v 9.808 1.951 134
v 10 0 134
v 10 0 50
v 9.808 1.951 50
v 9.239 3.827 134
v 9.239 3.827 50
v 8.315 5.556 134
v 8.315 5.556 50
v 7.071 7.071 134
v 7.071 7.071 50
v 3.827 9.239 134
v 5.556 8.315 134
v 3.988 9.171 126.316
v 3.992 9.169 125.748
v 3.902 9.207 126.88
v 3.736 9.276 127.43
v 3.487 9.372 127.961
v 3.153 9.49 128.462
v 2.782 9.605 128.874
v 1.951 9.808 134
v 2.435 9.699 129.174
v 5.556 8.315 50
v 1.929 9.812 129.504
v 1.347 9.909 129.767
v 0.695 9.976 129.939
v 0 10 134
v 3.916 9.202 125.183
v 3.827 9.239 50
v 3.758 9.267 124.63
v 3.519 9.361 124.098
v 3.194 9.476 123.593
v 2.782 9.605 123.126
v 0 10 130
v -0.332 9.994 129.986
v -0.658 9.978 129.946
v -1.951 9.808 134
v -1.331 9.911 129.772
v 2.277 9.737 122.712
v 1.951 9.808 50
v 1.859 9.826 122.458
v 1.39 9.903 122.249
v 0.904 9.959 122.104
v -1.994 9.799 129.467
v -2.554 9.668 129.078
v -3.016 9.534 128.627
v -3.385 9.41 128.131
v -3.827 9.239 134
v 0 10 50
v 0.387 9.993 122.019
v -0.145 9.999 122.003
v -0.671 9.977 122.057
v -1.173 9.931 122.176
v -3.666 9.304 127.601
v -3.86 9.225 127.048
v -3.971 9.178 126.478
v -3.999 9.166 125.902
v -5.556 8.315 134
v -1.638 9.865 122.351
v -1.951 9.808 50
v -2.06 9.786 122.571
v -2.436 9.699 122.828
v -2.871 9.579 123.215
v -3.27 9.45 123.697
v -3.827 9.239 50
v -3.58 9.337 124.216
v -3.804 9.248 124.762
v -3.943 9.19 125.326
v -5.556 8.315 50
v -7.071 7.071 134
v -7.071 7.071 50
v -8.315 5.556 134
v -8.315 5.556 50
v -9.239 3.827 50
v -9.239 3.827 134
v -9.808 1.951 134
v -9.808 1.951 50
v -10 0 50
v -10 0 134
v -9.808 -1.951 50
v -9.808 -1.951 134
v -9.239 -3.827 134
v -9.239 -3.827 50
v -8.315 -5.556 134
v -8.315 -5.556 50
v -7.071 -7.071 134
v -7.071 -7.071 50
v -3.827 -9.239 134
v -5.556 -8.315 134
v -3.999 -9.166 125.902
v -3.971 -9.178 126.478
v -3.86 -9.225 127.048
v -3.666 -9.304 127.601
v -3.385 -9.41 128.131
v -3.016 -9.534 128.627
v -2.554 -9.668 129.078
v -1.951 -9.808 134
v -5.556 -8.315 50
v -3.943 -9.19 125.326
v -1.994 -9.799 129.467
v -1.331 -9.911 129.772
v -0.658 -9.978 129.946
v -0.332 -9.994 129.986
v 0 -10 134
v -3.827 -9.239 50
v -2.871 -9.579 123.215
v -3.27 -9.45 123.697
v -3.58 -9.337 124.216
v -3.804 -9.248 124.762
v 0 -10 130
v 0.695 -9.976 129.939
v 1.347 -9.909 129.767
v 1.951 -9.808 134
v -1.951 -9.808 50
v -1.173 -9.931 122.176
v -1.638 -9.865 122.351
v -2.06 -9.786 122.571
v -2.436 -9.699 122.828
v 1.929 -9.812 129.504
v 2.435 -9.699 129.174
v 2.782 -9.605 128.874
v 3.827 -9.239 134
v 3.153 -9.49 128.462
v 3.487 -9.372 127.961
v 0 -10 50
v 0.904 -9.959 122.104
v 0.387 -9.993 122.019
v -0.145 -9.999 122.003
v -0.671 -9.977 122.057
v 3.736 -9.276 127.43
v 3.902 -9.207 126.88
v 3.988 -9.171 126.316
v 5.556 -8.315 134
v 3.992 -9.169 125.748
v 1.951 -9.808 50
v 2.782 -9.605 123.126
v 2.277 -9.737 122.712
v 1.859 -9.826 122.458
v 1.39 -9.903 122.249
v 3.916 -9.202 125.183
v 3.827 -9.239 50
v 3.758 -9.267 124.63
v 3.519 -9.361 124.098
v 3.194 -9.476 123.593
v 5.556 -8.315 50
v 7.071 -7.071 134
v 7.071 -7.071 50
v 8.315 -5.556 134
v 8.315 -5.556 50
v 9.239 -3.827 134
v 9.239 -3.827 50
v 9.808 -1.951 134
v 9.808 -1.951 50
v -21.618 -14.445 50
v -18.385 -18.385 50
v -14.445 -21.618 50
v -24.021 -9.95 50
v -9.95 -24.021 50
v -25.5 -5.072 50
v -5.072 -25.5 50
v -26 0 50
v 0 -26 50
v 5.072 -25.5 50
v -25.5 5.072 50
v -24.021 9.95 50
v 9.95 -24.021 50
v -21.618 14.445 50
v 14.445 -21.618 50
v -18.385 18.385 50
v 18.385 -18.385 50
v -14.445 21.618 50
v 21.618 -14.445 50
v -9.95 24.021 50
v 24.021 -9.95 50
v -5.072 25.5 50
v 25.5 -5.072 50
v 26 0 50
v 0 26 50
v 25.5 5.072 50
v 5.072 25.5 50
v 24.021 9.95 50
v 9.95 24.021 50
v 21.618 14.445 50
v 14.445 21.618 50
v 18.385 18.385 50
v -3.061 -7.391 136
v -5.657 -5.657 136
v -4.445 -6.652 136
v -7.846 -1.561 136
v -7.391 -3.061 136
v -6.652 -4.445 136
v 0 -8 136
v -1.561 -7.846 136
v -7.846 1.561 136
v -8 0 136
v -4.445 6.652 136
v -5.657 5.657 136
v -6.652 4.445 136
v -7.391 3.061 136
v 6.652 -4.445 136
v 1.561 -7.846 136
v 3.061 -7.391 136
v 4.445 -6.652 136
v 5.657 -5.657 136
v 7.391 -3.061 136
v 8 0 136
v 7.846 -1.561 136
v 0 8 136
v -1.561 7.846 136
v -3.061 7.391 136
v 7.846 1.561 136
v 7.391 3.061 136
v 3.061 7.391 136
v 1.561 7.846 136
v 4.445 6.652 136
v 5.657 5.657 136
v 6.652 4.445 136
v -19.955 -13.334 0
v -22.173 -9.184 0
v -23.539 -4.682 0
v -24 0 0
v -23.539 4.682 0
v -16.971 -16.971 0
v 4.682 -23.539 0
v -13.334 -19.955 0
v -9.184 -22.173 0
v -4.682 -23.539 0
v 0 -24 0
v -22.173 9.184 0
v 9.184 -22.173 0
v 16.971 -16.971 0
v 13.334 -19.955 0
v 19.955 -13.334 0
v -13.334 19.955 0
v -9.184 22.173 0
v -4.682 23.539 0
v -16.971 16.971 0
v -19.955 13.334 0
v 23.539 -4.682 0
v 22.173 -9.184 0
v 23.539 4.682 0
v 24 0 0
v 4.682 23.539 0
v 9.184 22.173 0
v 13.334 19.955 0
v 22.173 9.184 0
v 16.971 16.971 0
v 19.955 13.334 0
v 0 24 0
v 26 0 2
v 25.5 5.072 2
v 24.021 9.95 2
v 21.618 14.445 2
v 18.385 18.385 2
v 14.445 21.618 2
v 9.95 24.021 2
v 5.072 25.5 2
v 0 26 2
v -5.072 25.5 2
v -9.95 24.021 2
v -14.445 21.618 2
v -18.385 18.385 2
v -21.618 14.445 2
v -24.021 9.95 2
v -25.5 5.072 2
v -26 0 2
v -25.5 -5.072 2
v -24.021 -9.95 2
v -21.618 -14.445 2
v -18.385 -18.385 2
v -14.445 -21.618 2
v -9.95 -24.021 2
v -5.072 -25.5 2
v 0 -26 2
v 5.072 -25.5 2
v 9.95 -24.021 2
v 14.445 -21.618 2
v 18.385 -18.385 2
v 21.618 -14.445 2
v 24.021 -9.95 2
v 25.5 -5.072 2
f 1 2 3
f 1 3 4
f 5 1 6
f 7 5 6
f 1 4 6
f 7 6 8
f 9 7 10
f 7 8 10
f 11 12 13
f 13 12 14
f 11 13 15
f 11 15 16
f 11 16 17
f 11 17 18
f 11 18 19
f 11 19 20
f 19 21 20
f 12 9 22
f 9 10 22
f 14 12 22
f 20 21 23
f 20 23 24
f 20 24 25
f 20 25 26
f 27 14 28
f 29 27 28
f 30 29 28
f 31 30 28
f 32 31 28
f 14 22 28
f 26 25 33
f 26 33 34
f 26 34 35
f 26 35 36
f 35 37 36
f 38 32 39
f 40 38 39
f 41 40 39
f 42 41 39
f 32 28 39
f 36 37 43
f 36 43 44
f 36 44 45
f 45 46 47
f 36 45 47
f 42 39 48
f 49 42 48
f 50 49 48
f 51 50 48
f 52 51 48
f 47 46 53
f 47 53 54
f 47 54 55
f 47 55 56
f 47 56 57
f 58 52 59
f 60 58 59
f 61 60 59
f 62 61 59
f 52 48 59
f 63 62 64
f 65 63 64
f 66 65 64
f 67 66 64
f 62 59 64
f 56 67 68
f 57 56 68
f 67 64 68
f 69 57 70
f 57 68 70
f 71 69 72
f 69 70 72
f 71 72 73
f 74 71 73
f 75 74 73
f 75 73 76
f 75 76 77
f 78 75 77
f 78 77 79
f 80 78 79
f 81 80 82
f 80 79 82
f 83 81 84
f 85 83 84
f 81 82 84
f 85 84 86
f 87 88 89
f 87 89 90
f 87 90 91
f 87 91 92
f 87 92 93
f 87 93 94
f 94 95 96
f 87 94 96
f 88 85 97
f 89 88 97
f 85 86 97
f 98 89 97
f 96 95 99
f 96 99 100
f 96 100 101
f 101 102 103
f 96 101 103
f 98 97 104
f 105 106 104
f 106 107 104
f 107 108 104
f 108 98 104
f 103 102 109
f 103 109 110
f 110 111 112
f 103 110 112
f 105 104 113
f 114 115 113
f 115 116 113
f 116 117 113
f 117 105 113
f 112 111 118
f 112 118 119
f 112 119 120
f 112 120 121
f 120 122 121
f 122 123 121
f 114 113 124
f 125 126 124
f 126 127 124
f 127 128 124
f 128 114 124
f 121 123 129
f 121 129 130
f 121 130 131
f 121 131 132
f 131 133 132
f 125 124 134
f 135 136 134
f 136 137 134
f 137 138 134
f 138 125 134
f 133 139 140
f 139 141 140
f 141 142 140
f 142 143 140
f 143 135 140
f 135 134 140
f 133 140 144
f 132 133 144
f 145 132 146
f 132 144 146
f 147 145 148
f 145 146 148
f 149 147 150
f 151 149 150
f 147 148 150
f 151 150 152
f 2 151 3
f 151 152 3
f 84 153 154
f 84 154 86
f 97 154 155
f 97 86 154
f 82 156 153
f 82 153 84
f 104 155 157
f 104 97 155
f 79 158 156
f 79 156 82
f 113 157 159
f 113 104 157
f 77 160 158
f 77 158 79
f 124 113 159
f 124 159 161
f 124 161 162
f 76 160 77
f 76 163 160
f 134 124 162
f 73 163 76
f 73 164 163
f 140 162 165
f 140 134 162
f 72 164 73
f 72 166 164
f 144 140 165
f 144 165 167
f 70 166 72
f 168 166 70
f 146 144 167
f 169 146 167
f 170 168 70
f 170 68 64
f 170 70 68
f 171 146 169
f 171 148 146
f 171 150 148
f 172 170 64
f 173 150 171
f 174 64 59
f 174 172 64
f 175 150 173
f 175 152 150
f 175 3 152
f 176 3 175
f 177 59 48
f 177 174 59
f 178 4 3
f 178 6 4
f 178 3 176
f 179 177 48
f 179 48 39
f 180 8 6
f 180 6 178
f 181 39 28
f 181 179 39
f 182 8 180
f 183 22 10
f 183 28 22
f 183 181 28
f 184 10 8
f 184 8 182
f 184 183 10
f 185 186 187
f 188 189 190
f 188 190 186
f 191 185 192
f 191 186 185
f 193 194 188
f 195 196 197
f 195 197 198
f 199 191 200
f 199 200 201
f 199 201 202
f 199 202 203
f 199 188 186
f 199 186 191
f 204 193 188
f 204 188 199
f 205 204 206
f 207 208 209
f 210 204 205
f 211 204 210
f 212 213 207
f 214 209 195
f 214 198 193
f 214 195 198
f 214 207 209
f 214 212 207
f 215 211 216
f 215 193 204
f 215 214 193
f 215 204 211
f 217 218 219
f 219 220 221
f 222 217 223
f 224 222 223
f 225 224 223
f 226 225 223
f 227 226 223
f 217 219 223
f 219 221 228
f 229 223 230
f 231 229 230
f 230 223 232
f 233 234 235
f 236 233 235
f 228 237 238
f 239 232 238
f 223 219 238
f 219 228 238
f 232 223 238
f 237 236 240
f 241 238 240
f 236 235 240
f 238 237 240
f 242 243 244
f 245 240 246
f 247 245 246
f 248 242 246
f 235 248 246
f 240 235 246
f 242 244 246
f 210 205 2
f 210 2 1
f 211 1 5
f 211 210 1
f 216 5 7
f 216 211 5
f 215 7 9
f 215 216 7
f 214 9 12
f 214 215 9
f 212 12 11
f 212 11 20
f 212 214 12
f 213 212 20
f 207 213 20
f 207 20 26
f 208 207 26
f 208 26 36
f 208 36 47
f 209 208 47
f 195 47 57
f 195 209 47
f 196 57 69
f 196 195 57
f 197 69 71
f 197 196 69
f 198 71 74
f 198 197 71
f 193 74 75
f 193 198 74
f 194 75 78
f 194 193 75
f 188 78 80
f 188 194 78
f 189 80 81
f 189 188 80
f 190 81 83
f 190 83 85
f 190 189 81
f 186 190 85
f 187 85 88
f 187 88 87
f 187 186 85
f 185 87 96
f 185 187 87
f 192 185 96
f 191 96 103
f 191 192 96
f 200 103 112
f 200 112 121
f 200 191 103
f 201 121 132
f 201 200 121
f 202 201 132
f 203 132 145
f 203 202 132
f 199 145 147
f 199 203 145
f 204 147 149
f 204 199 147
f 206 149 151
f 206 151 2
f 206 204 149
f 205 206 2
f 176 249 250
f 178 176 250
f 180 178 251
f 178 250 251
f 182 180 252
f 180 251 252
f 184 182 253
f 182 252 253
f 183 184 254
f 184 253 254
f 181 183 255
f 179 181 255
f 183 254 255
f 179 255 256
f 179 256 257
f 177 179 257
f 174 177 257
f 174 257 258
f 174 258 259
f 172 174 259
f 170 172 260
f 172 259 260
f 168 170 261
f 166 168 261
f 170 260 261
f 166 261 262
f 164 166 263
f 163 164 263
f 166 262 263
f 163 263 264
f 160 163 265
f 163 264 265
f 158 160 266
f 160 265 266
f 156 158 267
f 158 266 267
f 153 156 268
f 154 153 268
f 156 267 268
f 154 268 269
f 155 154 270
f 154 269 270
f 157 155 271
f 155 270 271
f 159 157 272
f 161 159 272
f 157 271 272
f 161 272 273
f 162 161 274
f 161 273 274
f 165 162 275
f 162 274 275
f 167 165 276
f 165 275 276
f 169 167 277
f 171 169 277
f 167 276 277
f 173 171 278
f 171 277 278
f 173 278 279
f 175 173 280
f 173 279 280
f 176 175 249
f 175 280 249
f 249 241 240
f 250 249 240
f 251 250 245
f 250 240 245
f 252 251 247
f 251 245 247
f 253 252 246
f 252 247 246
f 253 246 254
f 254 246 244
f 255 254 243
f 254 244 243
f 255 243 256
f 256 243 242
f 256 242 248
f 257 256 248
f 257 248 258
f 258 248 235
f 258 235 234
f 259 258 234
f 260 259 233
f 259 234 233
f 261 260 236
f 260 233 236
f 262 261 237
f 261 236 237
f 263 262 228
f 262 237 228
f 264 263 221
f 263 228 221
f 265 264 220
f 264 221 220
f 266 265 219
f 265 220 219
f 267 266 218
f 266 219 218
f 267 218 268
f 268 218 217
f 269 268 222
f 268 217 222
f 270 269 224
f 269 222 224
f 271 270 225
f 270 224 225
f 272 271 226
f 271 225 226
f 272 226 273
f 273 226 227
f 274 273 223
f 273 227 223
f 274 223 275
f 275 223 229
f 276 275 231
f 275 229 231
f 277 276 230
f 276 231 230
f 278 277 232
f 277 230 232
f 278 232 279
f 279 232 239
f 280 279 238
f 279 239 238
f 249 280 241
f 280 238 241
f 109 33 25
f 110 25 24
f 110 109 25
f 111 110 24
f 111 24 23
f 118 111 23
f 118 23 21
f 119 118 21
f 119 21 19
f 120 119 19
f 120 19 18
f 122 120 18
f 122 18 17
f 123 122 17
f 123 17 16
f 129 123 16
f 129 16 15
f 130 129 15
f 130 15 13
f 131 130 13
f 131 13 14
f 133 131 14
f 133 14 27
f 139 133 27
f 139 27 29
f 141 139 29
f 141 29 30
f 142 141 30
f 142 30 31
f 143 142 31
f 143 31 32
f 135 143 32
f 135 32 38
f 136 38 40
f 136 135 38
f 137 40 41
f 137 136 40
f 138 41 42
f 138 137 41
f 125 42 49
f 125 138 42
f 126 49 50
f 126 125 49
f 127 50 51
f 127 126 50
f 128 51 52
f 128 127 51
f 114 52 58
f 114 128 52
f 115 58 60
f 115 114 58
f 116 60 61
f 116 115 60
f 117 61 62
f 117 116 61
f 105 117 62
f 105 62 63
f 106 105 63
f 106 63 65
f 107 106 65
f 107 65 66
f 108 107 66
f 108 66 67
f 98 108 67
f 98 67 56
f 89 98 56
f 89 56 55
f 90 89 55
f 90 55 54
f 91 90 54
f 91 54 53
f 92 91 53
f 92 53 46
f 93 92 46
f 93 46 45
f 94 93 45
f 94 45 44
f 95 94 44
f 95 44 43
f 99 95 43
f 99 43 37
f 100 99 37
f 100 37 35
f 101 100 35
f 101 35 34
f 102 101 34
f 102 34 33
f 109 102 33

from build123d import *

# Parameters (mm, degrees)
SCHIZZO1_R             = 26
ESTRUSIONE1_DEPTH      = 50
SCHIZZO2_R             = 10
ESTRUSIONE2_DEPTH      = 86
SMUSSO1_SIZE           = 2
ESTRUSIONE3_DEPTH      = 141.882930123
ESTRUSIONE3_DEPTH_BACK = 141.882930123
SCHIZZO3_R             = 4
SMUSSO2_SIZE           = 2


with BuildPart() as part:
    # Schizzo1 → Estrusione1 (new body)
    with BuildSketch(Plane.XY):
        Circle(SCHIZZO1_R)
    extrude(amount=ESTRUSIONE1_DEPTH)

    # Schizzo2 → Estrusione2 (add)
    with BuildSketch(Plane.XY.offset(50)):
        Circle(SCHIZZO2_R)
    extrude(amount=ESTRUSIONE2_DEPTH)

    # Smusso1
    smusso1_edges = [part.edges().sort_by_distance(p)[0] for p in [
        (-10, 0, 136),
    ]]
    chamfer(smusso1_edges, length=SMUSSO1_SIZE)

    # Schizzo3 → Estrusione3 (cut, two sides: drawn at the far end of the back side and taken through both)
    with BuildSketch(Plane(origin=(0, 0, 0), x_dir=(1, 0, 0), z_dir=(0, 1, 0)).offset(-ESTRUSIONE3_DEPTH_BACK)):
        with Locations(Location((0, -126, 0), (0, 0, 270))):
            Circle(SCHIZZO3_R)
    extrude(amount=ESTRUSIONE3_DEPTH + ESTRUSIONE3_DEPTH_BACK, mode=Mode.SUBTRACT)

    # Smusso2
    smusso2_edges = [part.edges().sort_by_distance(p)[0] for p in [
        (-26, 0, 0),
    ]]
    chamfer(smusso2_edges, length=SMUSSO2_SIZE)


solid = part.part
